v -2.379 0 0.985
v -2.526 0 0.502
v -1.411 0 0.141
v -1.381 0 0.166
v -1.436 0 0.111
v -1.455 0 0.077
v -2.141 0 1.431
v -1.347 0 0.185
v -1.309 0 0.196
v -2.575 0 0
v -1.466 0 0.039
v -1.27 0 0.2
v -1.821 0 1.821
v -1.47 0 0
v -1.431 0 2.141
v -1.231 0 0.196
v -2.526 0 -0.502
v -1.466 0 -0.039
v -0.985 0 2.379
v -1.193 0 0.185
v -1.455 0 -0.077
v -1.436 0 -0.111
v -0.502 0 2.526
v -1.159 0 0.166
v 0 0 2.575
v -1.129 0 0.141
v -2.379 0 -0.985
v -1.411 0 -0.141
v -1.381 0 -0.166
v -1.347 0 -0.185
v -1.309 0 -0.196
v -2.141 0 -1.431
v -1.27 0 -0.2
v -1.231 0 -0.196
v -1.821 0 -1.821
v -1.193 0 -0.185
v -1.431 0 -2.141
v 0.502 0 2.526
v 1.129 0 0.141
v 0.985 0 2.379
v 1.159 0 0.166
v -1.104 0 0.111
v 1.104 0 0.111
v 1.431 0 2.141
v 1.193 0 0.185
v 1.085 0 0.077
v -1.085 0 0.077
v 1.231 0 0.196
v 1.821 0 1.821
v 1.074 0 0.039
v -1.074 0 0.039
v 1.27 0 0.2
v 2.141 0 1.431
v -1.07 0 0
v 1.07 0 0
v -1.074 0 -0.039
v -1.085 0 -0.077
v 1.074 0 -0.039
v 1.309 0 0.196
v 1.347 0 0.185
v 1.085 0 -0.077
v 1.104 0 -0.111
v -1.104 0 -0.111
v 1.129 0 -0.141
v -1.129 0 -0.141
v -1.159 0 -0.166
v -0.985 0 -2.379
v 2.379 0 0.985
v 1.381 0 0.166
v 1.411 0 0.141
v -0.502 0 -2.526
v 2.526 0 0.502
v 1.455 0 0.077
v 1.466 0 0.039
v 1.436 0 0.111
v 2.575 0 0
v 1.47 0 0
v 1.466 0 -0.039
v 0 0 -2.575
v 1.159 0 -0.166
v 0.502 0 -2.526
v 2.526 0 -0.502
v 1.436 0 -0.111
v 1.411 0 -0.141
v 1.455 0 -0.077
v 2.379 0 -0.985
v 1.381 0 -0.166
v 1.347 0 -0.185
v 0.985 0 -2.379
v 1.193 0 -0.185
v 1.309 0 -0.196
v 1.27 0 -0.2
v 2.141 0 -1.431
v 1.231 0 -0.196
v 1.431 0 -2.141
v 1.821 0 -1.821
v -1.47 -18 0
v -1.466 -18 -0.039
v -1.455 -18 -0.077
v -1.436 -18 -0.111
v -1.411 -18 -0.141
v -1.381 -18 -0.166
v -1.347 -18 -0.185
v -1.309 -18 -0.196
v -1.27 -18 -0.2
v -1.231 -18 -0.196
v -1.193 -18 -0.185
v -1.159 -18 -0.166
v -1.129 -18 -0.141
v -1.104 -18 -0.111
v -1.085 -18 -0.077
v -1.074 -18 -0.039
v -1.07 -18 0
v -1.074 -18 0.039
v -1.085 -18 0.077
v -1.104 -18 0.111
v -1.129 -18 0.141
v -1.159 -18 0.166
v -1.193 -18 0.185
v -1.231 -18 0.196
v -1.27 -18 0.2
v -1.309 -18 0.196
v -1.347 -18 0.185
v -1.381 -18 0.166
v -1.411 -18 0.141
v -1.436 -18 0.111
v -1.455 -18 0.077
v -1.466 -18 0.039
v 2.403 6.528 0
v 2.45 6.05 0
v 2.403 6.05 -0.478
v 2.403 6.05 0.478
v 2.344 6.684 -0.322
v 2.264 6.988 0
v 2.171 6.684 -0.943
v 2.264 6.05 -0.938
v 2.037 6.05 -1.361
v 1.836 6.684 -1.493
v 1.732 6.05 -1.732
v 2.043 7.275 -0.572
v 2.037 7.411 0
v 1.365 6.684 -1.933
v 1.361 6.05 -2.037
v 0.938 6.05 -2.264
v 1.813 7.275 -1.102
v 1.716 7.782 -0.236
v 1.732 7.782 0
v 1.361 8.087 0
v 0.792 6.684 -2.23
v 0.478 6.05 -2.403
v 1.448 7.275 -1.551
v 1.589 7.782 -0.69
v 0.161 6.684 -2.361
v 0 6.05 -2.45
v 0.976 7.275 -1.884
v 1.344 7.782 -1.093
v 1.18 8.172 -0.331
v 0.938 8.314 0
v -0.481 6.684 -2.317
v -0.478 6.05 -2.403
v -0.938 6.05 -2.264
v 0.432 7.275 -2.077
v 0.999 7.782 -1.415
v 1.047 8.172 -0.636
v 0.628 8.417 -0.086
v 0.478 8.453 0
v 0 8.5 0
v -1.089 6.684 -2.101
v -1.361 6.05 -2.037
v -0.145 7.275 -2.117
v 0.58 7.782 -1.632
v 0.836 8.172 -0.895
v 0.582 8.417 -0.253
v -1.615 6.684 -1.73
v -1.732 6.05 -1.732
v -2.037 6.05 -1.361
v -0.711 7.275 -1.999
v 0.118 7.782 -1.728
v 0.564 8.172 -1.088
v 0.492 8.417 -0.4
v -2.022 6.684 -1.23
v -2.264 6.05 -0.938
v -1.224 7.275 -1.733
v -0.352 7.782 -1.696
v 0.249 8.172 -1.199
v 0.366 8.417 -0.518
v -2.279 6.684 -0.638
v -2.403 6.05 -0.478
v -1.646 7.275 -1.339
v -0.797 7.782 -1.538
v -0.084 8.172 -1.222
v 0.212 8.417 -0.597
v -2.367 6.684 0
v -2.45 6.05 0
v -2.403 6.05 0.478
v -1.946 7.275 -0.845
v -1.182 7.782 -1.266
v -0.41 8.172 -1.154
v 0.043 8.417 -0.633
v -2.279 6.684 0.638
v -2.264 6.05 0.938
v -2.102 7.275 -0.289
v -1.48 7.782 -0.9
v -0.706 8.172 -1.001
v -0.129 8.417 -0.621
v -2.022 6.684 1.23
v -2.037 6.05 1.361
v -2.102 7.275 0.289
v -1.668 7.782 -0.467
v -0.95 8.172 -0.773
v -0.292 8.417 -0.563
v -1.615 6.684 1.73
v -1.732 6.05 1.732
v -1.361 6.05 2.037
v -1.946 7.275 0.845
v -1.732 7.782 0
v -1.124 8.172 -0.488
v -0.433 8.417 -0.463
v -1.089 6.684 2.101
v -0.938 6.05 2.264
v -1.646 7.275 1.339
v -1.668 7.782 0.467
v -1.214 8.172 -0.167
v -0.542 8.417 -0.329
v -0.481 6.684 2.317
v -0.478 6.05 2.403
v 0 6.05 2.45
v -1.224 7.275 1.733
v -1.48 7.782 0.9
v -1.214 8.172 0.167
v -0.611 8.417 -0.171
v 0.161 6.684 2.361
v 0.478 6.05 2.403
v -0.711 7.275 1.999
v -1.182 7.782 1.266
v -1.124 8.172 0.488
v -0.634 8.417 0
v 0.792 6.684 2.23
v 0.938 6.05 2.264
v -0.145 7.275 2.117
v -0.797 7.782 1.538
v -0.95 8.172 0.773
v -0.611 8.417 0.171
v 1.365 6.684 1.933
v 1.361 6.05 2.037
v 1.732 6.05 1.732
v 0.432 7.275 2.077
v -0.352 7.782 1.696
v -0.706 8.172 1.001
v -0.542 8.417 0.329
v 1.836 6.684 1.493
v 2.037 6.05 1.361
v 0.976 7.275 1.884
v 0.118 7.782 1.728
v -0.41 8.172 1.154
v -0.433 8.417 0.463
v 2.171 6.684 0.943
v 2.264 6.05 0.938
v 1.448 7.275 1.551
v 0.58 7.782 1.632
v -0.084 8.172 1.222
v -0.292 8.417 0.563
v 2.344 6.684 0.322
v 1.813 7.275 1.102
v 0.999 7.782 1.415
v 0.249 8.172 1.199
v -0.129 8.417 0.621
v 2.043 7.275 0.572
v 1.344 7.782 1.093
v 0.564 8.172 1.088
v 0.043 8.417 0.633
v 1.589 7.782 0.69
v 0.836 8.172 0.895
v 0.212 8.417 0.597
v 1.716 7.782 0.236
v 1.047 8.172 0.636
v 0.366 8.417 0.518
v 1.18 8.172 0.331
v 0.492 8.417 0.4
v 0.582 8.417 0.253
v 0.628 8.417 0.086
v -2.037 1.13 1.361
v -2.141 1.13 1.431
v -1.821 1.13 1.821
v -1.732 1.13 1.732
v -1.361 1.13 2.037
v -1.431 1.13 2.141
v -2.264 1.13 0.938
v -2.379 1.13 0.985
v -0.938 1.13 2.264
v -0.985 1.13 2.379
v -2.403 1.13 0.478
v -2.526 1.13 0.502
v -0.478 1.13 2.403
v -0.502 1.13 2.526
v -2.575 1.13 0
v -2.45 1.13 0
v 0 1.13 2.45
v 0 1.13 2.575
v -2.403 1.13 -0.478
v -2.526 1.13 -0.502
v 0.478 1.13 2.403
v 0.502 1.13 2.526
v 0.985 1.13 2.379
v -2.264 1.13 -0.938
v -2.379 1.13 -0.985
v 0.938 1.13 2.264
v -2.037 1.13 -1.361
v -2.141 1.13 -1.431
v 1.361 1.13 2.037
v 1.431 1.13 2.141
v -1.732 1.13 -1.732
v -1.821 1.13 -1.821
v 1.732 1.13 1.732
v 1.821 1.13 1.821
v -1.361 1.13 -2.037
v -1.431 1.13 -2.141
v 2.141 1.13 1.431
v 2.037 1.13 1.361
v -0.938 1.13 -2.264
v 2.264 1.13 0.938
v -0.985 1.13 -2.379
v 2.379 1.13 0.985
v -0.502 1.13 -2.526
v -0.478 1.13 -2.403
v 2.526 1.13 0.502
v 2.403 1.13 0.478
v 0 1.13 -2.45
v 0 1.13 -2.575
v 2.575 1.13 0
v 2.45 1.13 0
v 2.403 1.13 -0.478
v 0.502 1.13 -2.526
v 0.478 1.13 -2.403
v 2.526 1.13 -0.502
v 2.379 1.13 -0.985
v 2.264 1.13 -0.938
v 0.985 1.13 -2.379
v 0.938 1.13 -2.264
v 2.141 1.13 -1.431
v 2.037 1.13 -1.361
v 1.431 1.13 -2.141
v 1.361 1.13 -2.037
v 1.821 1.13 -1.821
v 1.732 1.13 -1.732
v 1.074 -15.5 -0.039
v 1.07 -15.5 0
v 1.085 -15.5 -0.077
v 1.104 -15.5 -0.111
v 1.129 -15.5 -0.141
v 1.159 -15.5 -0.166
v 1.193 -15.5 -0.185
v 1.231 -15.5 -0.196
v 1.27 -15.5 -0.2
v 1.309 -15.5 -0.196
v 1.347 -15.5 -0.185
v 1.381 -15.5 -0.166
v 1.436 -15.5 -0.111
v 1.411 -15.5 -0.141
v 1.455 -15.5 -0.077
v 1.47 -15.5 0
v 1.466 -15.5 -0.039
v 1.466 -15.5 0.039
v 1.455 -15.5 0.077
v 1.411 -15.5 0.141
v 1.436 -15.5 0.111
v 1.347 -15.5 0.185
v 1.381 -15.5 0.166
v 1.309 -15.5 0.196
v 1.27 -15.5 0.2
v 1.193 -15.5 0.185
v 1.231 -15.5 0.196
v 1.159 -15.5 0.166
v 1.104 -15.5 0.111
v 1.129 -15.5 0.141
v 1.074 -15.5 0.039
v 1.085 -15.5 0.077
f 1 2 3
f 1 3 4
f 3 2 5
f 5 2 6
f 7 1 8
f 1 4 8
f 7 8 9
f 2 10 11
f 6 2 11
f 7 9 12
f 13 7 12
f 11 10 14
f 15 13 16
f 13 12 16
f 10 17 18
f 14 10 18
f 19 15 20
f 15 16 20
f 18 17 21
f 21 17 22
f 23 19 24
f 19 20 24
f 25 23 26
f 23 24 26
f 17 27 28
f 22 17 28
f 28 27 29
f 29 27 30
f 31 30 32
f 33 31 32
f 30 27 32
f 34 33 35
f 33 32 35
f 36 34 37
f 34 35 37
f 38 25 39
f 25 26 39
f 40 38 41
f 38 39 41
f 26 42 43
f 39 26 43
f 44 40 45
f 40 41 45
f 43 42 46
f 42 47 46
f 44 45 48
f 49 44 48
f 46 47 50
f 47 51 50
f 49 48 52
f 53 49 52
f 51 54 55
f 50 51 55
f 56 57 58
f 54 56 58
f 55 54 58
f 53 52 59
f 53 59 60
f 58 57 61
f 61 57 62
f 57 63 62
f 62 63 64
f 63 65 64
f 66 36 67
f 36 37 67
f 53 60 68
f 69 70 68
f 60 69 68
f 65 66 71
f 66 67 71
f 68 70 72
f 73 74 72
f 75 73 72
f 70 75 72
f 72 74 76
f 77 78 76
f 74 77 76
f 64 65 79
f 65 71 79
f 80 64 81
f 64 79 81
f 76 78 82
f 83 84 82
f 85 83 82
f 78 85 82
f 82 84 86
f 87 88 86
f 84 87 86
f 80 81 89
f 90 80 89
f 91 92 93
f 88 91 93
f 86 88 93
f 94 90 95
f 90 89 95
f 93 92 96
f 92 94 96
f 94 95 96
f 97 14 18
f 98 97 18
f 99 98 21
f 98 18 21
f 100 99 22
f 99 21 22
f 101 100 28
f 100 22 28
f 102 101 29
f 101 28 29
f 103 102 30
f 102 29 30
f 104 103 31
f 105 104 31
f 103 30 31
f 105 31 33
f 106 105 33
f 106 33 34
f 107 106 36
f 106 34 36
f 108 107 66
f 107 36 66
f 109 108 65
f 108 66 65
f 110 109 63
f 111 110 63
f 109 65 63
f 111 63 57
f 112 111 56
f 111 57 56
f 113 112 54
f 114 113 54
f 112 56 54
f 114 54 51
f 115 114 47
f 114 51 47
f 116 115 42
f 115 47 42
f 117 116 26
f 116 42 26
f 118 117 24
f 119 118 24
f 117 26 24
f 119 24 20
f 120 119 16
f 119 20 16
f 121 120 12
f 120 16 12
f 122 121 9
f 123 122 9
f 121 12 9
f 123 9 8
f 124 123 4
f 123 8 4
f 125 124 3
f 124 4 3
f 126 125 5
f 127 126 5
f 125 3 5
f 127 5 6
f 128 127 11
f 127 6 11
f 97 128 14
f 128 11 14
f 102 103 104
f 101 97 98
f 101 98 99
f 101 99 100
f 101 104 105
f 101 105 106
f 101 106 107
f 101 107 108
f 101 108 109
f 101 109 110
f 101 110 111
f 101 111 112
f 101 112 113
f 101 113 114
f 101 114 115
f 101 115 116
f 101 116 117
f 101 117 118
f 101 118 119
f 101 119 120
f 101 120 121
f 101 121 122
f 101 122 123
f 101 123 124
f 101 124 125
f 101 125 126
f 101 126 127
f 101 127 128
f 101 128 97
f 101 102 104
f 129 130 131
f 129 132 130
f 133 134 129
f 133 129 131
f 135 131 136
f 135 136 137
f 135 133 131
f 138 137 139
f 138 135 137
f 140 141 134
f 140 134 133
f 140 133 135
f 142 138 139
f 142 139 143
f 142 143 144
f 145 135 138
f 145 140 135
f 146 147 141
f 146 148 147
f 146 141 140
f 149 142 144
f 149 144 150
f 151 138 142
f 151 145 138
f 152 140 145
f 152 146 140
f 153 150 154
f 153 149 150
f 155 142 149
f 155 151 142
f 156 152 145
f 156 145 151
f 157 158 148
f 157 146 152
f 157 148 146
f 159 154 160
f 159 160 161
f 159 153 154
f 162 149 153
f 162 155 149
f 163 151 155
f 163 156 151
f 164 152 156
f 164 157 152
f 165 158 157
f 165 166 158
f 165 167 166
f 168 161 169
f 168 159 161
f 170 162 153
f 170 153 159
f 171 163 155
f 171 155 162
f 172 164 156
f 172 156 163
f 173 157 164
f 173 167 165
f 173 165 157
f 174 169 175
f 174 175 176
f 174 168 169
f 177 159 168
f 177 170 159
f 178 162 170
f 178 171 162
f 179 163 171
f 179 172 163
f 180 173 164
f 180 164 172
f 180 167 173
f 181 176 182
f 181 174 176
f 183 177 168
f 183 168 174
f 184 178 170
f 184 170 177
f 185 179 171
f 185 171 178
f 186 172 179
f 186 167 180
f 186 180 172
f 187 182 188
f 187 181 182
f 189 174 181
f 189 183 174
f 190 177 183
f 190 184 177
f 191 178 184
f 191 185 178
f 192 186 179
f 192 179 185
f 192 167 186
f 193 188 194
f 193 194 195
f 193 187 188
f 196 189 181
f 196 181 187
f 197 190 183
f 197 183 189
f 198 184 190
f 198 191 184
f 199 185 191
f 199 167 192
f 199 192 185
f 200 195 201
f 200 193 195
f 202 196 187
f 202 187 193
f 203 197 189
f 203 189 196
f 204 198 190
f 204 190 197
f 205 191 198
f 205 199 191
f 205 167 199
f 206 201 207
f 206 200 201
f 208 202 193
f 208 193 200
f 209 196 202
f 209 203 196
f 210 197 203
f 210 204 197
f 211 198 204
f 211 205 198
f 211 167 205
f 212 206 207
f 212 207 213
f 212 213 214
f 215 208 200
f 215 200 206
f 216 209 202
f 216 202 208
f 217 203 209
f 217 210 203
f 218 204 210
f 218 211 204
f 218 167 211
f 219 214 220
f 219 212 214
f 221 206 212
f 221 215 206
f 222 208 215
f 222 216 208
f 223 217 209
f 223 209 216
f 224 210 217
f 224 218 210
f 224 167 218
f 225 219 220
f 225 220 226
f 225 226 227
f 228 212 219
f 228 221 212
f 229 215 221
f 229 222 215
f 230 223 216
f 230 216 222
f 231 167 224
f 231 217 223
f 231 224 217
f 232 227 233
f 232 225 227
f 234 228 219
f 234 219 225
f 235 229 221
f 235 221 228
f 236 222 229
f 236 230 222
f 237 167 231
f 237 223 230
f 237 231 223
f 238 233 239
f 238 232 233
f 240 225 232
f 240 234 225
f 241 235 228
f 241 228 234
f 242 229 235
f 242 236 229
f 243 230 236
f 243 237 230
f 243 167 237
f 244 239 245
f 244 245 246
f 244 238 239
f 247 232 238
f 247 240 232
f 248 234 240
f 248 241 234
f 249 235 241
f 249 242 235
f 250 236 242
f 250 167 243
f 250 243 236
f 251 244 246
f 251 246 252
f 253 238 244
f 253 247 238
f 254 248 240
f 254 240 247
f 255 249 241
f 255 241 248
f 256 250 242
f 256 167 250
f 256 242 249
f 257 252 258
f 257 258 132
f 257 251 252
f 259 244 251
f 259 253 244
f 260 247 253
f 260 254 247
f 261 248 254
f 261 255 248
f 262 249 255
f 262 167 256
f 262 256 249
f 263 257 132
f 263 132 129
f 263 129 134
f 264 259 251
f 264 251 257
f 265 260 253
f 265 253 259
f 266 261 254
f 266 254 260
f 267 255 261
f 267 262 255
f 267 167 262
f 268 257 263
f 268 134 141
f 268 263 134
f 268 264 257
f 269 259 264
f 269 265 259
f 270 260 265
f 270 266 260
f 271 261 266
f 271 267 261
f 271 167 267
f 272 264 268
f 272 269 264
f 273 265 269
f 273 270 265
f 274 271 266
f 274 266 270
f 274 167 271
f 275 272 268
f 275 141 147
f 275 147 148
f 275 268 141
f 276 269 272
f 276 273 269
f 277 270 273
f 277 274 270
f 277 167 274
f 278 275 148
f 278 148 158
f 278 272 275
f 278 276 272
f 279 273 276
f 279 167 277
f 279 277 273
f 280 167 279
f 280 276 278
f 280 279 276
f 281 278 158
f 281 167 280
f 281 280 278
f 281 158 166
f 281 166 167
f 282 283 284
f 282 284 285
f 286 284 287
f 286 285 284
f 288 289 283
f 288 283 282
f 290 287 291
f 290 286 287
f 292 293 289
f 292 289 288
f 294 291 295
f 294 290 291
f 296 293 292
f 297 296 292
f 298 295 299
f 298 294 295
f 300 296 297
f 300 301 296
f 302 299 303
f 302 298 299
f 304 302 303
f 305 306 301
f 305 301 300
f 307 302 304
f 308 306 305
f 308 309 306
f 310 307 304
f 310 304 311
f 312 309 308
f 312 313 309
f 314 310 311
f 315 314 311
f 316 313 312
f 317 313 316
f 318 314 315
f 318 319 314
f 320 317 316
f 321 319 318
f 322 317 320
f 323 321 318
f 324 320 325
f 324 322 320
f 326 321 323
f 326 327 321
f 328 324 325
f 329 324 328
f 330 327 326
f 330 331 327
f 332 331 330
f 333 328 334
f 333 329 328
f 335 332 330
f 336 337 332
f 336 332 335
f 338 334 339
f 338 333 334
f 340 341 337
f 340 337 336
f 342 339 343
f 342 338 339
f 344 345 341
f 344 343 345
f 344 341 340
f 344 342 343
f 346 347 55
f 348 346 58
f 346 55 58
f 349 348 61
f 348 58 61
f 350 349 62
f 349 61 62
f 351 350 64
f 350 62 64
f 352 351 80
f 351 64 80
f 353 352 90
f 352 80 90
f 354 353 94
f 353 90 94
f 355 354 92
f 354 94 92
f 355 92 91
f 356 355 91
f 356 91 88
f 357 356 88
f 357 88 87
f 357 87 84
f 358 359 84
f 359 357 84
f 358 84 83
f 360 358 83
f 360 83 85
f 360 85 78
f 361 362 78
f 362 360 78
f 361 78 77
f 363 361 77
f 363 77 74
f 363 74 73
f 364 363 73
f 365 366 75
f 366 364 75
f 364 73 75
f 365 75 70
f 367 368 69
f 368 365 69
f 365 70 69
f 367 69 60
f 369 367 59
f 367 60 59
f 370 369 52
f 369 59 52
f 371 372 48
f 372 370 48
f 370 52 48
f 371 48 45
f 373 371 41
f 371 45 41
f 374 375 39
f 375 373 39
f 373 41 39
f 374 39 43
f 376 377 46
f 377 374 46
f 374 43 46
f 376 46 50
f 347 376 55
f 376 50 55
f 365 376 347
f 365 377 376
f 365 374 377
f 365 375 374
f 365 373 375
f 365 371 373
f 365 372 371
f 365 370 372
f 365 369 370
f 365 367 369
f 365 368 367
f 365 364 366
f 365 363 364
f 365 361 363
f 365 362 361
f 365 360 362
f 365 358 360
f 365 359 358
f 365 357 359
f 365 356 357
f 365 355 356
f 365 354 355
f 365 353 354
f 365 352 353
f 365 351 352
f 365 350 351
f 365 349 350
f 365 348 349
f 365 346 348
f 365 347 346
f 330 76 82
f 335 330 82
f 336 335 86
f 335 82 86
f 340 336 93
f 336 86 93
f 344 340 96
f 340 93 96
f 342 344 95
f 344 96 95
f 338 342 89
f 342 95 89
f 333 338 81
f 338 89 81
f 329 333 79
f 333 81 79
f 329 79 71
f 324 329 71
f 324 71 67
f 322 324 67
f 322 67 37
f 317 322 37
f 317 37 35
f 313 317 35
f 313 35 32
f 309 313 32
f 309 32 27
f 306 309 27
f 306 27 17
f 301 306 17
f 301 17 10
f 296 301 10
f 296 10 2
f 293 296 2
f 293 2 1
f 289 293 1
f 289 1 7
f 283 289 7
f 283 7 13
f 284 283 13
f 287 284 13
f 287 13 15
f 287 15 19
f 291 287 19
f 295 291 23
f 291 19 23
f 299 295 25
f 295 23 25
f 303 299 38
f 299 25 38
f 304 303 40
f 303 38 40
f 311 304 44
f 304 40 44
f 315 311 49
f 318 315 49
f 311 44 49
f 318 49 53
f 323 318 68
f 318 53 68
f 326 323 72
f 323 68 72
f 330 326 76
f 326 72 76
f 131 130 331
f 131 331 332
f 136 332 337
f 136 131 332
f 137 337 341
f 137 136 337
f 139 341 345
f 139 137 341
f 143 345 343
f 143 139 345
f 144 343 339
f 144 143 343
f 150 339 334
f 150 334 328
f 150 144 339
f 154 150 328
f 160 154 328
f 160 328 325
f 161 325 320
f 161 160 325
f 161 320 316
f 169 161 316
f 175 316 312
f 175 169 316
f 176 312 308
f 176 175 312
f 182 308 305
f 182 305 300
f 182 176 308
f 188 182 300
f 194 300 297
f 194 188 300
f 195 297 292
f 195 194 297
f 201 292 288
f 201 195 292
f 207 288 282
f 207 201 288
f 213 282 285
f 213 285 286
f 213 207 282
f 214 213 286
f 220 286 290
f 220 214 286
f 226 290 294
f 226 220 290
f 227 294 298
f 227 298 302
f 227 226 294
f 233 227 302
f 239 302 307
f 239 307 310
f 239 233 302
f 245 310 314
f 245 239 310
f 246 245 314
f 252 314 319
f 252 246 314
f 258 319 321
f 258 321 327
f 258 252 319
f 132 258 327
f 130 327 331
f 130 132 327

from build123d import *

# Parameters (mm, degrees)
SKETCH1_R           = 2.575
BOSS_EXTRUDE1_DEPTH = 8.5
SKETCH2_R           = 2.575
SKETCH2_R_2         = 2.45
CUT_EXTRUDE1_DEPTH  = 7.37
FILLET2_R           = 2.45
SKETCH4_R           = 0.2
BOSS_EXTRUDE4_DEPTH = 18
SKETCH6_R           = 0.225
CUT_EXTRUDE2_DEPTH  = 2.5


with BuildPart() as part:
    # Sketch1 → Boss-Extrude1 (new body)
    with BuildSketch(Plane(origin=(0, 0, 0), x_dir=(1, 0, 0), z_dir=(0, 1, 0))):
        Circle(SKETCH1_R)
    extrude(amount=BOSS_EXTRUDE1_DEPTH)

    # Sketch2 → Cut-Extrude1 (cut)
    with BuildSketch(Plane(origin=(0, 8.5, 0), x_dir=(1, 0, 0), z_dir=(0, 1, 0))):
        Circle(SKETCH2_R)
        Circle(SKETCH2_R_2, mode=Mode.SUBTRACT)
    extrude(amount=-CUT_EXTRUDE1_DEPTH, mode=Mode.SUBTRACT)

    # Fillet2
    fillet2_edges = [part.edges().sort_by_distance(p)[0] for p in [
        (-2.45, 8.5, 0),
    ]]
    fillet(fillet2_edges, radius=FILLET2_R)

    # Sketch4 → Boss-Extrude4 (add)
    with BuildSketch(Plane(origin=(0, 0, 0), x_dir=(-1, 0, 0), z_dir=(0, -1, 0))):
        with Locations((1.27, 0)):
            Circle(SKETCH4_R)
        with Locations((-1.27, 0)):
            Circle(SKETCH4_R)
    extrude(amount=BOSS_EXTRUDE4_DEPTH)

    # Sketch6 → Cut-Extrude2 (cut)
    with BuildSketch(Plane.XZ.offset(18)):
        with Locations((1.27, 0)):
            Circle(SKETCH6_R)
    extrude(amount=-CUT_EXTRUDE2_DEPTH, mode=Mode.SUBTRACT)


solid = part.part
